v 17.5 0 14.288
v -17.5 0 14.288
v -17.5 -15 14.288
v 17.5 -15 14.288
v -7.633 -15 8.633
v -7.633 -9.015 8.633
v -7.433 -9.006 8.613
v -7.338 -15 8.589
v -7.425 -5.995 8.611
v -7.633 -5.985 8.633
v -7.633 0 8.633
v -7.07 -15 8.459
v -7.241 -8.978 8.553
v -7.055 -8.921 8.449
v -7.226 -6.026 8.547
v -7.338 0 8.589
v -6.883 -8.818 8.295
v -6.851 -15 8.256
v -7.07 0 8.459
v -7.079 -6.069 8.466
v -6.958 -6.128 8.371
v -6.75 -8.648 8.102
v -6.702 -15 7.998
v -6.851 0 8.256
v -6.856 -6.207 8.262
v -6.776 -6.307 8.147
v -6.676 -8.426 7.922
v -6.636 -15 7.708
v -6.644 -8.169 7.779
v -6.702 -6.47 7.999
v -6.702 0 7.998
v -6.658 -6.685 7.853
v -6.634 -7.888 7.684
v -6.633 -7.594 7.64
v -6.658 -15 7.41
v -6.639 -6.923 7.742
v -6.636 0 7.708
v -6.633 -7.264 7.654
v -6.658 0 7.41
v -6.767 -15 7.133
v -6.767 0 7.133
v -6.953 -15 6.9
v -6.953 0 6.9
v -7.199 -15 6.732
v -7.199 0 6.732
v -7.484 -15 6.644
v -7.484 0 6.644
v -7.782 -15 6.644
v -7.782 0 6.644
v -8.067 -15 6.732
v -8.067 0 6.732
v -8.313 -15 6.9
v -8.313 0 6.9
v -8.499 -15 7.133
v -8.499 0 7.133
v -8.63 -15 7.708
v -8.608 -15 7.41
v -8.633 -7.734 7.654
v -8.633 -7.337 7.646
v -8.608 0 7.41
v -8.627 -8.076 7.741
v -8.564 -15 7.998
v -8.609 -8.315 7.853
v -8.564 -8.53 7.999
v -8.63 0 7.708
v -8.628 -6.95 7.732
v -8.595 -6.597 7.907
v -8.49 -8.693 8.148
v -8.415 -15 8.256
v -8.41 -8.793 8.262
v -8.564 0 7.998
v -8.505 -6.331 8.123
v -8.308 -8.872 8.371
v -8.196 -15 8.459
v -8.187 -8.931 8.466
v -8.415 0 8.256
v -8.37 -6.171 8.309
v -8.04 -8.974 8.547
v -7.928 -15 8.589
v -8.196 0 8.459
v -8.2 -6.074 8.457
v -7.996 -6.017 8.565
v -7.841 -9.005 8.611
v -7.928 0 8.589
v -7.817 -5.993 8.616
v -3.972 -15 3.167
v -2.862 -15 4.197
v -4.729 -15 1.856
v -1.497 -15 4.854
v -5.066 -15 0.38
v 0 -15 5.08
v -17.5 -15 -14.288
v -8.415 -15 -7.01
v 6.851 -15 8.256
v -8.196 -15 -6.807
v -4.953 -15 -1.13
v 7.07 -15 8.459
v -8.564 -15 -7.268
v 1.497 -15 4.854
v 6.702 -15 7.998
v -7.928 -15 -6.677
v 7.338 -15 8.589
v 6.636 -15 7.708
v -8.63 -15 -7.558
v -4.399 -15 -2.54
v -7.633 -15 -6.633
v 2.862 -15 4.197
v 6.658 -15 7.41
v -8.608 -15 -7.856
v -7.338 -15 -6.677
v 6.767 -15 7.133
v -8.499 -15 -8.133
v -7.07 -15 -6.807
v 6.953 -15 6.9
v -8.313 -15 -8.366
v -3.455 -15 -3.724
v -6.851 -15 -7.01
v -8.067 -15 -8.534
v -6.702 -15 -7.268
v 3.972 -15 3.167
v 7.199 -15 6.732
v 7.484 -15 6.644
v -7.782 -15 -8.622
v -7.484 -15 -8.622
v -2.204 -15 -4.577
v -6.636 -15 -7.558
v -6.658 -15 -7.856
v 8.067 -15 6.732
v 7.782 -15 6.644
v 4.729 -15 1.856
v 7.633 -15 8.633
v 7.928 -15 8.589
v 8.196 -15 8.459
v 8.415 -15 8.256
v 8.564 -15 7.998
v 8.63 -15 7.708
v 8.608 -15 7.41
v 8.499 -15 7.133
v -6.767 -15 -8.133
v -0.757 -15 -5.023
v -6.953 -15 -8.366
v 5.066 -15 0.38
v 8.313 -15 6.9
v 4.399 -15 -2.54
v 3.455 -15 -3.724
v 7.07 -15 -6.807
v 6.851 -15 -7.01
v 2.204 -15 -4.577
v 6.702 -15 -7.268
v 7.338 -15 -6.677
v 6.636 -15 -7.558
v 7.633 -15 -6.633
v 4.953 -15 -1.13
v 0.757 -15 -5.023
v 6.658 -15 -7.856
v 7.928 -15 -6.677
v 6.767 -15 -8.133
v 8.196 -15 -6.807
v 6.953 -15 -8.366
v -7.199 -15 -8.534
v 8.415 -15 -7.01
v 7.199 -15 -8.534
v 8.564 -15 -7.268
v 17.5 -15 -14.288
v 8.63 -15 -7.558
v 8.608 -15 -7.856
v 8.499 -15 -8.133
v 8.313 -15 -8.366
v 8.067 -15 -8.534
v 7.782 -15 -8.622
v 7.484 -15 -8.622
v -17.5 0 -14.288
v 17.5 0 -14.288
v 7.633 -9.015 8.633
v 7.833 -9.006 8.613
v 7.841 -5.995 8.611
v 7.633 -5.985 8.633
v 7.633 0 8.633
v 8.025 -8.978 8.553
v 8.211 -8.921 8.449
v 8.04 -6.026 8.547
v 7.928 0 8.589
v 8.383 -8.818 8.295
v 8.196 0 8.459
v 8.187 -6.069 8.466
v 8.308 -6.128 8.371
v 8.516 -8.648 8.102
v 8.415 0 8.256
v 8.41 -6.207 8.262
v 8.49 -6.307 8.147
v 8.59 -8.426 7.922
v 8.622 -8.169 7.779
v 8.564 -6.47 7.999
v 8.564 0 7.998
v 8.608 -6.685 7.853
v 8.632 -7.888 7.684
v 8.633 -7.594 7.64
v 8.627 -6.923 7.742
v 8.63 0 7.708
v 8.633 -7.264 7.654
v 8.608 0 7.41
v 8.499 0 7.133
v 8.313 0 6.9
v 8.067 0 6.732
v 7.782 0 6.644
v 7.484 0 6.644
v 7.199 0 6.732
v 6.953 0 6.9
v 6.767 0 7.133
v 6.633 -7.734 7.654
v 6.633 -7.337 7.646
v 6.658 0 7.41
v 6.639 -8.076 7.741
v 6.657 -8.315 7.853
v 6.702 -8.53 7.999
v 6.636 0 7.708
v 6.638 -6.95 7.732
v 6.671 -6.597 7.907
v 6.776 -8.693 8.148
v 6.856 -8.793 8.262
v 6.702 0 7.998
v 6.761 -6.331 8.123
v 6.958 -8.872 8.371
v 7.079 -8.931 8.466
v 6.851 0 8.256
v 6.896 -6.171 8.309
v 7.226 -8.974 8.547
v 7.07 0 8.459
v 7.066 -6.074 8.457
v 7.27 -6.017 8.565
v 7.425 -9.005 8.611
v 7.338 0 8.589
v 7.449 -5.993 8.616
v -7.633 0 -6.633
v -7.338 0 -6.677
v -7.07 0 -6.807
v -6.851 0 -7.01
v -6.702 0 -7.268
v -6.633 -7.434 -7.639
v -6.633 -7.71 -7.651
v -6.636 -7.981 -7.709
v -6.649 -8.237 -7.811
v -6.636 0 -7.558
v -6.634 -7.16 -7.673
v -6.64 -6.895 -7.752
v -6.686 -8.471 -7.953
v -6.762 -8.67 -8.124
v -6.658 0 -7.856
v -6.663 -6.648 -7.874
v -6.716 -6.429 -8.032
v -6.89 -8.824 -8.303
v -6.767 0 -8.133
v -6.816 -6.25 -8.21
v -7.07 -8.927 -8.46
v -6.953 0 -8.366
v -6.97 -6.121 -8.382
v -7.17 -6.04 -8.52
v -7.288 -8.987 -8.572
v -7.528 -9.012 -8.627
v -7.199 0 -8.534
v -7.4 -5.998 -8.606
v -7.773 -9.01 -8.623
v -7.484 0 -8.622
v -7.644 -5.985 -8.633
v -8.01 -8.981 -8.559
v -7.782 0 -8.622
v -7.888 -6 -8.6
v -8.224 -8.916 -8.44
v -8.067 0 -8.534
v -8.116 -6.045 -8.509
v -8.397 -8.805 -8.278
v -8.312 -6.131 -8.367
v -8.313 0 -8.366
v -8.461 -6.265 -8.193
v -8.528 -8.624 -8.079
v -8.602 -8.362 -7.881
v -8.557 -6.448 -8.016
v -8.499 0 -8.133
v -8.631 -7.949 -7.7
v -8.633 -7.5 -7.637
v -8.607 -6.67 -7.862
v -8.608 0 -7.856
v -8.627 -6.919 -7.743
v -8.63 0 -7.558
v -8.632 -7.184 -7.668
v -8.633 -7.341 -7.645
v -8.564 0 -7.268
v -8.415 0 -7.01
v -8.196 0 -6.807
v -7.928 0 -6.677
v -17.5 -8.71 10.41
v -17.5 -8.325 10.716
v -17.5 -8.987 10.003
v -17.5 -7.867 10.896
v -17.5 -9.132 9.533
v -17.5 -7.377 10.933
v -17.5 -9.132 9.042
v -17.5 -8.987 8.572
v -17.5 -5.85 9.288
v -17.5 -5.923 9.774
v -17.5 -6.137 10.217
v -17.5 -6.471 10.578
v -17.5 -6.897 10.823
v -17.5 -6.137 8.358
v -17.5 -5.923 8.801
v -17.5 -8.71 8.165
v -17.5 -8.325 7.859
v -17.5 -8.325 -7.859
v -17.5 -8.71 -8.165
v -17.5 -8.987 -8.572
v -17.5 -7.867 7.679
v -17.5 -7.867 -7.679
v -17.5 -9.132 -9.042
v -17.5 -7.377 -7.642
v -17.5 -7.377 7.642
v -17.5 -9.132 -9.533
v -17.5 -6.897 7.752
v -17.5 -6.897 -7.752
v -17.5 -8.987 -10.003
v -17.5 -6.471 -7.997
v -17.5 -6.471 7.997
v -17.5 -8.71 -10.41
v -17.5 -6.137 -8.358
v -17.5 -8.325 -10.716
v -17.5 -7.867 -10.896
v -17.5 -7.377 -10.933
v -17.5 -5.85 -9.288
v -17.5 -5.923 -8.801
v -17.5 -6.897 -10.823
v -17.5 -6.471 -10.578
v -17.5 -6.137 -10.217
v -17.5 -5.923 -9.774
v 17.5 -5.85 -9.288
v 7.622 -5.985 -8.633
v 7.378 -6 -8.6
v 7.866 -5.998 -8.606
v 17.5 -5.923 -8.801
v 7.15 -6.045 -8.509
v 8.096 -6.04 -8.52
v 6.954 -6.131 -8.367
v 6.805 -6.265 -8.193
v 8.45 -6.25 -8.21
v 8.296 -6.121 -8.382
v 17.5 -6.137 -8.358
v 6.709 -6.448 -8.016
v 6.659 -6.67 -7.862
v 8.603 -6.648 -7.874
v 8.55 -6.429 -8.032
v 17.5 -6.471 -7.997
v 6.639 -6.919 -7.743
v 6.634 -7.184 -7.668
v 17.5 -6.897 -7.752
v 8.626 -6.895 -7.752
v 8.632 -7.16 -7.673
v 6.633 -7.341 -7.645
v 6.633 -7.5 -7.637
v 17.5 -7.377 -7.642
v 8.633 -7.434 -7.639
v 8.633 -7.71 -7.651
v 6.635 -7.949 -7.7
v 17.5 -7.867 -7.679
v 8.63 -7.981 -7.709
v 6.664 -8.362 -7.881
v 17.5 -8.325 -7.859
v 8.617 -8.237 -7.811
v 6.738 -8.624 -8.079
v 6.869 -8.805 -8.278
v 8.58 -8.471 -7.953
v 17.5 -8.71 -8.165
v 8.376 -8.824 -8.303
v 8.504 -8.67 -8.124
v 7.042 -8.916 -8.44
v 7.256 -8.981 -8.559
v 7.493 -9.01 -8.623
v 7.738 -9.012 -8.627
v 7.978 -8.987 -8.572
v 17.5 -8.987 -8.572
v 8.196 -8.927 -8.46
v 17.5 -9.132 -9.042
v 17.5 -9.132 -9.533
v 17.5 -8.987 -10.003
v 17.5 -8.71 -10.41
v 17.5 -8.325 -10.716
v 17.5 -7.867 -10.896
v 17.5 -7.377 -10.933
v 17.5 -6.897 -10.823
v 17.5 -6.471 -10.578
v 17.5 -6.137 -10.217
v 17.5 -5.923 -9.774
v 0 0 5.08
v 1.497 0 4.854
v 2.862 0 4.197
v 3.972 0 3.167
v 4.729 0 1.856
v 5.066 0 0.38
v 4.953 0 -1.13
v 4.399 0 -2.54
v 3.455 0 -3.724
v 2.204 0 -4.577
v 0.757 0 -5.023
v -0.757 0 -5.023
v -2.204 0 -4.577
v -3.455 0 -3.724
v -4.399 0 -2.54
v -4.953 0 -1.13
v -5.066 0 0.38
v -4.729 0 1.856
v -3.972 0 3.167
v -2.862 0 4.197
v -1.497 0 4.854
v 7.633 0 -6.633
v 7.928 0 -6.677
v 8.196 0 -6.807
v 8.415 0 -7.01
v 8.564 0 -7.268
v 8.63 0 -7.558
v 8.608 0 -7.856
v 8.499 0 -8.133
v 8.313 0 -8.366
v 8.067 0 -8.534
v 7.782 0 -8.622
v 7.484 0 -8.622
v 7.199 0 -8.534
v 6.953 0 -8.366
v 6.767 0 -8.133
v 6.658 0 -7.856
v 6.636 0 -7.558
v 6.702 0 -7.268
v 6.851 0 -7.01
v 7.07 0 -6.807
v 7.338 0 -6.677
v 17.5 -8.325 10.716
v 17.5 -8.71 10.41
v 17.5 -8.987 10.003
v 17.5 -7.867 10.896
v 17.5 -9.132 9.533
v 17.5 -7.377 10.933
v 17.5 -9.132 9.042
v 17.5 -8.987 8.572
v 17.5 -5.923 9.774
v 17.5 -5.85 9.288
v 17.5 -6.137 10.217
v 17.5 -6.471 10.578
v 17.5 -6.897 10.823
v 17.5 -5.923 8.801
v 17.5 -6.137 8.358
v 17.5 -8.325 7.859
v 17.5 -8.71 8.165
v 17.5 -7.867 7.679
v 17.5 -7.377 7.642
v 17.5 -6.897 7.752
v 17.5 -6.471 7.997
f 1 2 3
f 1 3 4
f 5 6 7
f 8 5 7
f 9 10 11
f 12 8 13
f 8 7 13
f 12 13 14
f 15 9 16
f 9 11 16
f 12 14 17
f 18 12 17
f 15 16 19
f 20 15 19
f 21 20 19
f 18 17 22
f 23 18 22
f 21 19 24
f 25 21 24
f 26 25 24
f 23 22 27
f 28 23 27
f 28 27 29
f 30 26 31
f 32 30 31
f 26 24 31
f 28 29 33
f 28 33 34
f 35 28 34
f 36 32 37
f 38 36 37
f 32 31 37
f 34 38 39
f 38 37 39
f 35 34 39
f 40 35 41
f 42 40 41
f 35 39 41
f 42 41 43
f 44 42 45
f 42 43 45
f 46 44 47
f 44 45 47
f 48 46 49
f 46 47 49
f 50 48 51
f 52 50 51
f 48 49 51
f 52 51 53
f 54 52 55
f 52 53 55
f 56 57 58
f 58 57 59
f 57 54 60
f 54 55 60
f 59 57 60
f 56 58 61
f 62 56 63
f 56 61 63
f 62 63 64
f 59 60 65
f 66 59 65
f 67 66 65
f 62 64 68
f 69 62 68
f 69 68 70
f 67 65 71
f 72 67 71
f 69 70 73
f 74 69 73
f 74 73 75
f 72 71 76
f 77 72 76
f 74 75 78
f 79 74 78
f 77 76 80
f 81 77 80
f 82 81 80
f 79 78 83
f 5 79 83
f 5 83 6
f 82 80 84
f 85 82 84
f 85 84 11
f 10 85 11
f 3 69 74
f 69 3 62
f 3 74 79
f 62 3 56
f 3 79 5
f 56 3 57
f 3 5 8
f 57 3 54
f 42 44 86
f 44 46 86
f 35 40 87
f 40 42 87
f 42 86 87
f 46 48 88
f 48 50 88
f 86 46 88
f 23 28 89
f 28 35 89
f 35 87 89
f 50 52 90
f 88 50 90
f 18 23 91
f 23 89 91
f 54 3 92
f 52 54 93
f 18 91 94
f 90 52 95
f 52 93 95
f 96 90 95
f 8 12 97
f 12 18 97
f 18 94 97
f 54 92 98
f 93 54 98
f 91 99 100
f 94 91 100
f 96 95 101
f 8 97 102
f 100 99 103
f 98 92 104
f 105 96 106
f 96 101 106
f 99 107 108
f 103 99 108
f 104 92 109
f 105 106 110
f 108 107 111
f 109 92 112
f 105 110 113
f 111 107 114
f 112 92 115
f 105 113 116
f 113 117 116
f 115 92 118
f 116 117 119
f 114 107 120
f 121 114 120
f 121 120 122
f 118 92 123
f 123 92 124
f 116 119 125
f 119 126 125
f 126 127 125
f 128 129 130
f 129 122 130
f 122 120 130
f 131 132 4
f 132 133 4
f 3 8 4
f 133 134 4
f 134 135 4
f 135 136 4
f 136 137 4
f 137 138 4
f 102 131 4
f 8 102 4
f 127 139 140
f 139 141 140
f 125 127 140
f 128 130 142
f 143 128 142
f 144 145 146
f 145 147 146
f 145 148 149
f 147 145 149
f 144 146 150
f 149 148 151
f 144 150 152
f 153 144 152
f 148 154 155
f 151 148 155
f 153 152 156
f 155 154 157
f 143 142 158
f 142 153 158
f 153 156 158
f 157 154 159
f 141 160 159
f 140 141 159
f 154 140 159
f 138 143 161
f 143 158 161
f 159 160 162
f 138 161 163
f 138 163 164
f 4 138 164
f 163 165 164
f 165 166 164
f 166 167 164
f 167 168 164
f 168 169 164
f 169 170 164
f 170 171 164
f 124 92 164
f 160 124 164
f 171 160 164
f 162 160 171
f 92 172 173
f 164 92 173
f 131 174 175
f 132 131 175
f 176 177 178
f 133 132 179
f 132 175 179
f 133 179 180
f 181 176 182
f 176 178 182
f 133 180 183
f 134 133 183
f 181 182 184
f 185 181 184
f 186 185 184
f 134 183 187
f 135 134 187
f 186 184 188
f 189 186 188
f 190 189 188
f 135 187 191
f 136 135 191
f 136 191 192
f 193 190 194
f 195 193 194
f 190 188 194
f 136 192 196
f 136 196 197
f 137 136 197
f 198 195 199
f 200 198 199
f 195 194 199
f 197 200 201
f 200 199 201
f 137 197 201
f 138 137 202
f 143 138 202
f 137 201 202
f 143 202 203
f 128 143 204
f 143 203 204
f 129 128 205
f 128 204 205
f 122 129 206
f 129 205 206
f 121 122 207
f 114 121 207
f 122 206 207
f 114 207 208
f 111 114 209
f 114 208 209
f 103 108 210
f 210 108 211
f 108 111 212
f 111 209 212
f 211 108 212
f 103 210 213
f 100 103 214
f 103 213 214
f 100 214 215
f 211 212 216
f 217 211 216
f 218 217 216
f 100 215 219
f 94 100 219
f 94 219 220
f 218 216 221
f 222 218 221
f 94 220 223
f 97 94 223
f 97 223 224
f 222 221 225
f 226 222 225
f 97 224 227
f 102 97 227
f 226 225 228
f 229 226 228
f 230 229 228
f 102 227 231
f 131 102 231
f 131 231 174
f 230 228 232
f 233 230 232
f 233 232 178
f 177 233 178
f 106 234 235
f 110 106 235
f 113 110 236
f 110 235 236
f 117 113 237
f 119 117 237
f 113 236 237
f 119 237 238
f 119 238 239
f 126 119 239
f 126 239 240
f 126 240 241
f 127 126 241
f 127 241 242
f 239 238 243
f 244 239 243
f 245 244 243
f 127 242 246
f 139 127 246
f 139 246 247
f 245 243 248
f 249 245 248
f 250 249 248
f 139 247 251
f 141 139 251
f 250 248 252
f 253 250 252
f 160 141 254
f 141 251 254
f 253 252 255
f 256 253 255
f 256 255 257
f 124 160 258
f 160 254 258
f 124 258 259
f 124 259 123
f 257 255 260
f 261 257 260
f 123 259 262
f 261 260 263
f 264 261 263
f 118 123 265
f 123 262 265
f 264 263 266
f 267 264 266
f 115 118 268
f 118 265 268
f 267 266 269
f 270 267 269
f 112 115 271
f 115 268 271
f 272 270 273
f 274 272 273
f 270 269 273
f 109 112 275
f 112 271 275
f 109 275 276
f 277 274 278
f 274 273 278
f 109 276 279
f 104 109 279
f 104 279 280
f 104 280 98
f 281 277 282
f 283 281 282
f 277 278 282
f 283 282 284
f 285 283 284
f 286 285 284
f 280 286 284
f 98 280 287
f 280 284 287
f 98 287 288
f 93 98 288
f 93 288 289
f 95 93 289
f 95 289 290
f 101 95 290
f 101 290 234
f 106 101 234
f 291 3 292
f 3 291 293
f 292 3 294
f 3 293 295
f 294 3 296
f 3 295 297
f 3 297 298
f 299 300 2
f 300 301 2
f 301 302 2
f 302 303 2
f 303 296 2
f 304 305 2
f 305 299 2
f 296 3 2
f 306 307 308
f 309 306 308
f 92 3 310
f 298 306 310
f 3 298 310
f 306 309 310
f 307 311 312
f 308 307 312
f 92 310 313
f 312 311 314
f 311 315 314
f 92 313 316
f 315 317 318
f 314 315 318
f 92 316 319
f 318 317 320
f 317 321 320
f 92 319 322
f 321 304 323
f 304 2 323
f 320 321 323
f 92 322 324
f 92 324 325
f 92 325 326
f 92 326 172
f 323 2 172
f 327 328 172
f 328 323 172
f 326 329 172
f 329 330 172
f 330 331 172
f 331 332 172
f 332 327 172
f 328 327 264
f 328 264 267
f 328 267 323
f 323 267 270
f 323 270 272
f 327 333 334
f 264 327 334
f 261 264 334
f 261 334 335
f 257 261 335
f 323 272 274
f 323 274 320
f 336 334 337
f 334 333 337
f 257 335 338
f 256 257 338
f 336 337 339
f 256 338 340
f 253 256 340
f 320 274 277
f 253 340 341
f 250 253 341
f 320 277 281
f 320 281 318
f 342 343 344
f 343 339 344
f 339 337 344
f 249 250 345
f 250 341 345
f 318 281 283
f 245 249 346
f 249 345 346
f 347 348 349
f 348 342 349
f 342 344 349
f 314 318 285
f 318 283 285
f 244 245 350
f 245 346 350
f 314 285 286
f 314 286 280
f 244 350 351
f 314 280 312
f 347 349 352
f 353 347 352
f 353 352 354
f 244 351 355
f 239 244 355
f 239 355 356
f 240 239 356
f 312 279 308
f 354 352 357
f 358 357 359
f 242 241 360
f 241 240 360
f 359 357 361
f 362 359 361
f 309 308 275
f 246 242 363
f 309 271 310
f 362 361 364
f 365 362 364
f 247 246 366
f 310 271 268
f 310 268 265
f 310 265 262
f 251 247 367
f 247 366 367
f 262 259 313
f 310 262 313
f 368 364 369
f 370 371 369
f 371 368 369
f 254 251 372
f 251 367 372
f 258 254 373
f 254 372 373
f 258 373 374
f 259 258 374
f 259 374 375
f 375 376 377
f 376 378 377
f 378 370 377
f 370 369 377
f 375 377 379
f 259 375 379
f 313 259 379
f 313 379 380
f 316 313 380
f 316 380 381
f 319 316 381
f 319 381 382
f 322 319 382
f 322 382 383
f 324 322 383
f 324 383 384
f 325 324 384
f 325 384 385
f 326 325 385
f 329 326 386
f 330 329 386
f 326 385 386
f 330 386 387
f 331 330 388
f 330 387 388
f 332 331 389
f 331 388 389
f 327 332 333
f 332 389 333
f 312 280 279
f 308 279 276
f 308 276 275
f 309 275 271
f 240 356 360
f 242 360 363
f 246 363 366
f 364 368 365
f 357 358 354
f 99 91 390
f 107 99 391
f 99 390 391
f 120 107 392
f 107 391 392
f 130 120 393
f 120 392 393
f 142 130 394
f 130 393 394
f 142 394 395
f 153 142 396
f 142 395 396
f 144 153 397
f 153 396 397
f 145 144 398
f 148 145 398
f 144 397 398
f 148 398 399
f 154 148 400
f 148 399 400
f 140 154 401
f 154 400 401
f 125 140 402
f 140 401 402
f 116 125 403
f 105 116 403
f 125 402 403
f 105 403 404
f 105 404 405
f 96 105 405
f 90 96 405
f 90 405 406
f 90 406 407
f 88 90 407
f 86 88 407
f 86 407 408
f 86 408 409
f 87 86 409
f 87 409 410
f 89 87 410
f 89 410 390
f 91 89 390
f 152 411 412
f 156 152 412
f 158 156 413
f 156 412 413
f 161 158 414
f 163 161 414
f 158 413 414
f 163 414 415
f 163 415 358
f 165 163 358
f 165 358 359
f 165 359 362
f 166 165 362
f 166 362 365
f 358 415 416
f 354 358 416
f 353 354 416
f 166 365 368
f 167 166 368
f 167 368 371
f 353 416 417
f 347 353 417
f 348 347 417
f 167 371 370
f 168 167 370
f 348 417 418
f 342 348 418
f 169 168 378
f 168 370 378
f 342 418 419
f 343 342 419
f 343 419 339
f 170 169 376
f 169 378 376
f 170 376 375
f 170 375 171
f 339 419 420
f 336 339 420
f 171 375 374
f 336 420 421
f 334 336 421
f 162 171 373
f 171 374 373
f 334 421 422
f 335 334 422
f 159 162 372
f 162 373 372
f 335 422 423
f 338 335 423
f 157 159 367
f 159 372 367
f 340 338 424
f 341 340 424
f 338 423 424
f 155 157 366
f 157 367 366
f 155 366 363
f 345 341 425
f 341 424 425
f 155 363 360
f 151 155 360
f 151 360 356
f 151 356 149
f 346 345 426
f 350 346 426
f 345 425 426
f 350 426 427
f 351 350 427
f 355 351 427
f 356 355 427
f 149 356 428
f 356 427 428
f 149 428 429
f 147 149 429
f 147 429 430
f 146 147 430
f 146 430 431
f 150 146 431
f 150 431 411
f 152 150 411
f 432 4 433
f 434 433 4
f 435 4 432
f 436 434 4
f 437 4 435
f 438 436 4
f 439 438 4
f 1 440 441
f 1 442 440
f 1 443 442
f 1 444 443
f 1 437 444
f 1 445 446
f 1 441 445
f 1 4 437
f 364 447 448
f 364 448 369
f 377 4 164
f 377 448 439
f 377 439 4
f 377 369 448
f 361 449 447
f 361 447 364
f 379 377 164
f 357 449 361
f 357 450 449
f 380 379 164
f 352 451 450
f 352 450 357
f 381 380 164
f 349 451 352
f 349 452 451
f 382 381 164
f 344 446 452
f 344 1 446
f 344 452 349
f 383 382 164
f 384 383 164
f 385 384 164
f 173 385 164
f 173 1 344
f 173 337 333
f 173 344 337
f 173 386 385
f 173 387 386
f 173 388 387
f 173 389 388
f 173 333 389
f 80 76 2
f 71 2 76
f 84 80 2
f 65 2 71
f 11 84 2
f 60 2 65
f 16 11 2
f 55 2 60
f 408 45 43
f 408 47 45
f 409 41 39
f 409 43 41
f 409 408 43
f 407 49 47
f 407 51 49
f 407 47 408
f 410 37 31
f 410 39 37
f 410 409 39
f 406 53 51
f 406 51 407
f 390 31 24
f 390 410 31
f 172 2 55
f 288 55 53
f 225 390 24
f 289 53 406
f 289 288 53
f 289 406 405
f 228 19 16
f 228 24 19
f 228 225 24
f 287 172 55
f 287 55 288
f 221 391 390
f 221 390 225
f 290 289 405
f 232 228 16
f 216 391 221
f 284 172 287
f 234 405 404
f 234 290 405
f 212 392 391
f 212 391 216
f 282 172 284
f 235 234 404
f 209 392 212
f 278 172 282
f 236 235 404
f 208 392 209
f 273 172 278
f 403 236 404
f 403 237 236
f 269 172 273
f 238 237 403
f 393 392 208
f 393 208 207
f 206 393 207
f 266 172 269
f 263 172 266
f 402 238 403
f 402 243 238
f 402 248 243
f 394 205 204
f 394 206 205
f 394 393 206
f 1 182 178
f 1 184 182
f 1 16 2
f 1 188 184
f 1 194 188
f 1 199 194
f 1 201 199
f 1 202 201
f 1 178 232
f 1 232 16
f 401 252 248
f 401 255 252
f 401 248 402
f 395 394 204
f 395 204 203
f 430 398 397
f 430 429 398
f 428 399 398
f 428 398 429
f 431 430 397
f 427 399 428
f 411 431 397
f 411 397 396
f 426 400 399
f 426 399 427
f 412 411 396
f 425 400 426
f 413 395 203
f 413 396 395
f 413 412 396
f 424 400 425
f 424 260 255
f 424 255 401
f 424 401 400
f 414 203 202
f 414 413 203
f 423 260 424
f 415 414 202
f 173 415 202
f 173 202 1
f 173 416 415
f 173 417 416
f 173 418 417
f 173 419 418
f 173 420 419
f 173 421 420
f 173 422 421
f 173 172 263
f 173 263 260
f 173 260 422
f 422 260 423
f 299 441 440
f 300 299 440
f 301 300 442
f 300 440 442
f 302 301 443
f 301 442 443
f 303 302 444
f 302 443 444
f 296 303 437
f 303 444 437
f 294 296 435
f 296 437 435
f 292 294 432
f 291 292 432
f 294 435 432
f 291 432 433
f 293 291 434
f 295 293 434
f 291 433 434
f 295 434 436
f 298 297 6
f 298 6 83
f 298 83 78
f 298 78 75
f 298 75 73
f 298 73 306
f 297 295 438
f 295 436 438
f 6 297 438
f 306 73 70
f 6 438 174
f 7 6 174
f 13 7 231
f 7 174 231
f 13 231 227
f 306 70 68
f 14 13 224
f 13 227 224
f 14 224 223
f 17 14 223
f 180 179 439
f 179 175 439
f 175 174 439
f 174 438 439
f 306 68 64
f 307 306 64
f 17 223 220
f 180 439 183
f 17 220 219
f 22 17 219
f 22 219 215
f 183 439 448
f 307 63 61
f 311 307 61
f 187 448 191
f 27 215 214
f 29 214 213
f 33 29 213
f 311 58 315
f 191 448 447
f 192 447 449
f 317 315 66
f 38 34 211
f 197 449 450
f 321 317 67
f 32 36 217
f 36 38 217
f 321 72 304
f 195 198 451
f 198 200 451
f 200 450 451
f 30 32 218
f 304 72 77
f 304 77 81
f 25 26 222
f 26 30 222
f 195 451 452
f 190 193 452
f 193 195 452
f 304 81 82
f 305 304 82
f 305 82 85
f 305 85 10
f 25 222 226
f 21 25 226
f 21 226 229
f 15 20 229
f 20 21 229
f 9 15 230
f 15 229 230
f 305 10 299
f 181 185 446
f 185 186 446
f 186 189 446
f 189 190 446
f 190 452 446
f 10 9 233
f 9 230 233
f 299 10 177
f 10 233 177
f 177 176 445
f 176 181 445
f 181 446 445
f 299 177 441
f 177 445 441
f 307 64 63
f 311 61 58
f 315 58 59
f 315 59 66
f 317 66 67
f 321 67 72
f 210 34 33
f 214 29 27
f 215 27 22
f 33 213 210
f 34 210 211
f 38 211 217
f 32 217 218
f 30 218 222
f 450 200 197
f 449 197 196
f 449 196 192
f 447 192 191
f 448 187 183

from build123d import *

# Parameters (mm, degrees)
SKETCH1_W             = 35
SKETCH1_H             = 28.575
BOSS_EXTRUDE1_DEPTH   = 15
SKETCH2_R             = 5.08
CUT_EXTRUDE2_DEPTH    = 30
SKETCH4_R             = 1
CUT_EXTRUDE3_DEPTH    = 15
M4X0_7_TAPPED_HOLE1_D = 3.3


with BuildPart() as part:
    # Sketch1 → Boss-Extrude1 (new body)
    with BuildSketch(Plane(origin=(0, 0, 0), x_dir=(1, 0, 0), z_dir=(0, 1, 0))):
        Rectangle(SKETCH1_W, SKETCH1_H)
    extrude(amount=-BOSS_EXTRUDE1_DEPTH)

    # Sketch2 → Cut-Extrude2 (cut)
    with BuildSketch(Plane(origin=(0, 0, 0), x_dir=(1, 0, 0), z_dir=(0, 1, 0))):
        Circle(SKETCH2_R)
    extrude(amount=-CUT_EXTRUDE2_DEPTH, mode=Mode.SUBTRACT)

    # Sketch4 → Cut-Extrude3 (cut)
    with BuildSketch(Plane(origin=(0, 0, 0), x_dir=(1, 0, 0), z_dir=(0, 1, 0))):
        with Locations((7.633, 7.633)):
            Circle(SKETCH4_R)
        with Locations((-7.633, 7.633)):
            Circle(SKETCH4_R)
        with Locations((-7.633, -7.633)):
            Circle(SKETCH4_R)
        with Locations((7.633, -7.633)):
            Circle(SKETCH4_R)
    extrude(amount=-CUT_EXTRUDE3_DEPTH, mode=Mode.SUBTRACT)

    # M4x0.7 Tapped Hole1 (through all)
    with Locations(Plane(origin=(-17.5, 0, 0), x_dir=(0, -1, 0), z_dir=(-1, 0, 0))):
        with Locations((7.5, -9.2875), (7.5, 9.2875)):
            Hole(M4X0_7_TAPPED_HOLE1_D / 2)


solid = part.part
